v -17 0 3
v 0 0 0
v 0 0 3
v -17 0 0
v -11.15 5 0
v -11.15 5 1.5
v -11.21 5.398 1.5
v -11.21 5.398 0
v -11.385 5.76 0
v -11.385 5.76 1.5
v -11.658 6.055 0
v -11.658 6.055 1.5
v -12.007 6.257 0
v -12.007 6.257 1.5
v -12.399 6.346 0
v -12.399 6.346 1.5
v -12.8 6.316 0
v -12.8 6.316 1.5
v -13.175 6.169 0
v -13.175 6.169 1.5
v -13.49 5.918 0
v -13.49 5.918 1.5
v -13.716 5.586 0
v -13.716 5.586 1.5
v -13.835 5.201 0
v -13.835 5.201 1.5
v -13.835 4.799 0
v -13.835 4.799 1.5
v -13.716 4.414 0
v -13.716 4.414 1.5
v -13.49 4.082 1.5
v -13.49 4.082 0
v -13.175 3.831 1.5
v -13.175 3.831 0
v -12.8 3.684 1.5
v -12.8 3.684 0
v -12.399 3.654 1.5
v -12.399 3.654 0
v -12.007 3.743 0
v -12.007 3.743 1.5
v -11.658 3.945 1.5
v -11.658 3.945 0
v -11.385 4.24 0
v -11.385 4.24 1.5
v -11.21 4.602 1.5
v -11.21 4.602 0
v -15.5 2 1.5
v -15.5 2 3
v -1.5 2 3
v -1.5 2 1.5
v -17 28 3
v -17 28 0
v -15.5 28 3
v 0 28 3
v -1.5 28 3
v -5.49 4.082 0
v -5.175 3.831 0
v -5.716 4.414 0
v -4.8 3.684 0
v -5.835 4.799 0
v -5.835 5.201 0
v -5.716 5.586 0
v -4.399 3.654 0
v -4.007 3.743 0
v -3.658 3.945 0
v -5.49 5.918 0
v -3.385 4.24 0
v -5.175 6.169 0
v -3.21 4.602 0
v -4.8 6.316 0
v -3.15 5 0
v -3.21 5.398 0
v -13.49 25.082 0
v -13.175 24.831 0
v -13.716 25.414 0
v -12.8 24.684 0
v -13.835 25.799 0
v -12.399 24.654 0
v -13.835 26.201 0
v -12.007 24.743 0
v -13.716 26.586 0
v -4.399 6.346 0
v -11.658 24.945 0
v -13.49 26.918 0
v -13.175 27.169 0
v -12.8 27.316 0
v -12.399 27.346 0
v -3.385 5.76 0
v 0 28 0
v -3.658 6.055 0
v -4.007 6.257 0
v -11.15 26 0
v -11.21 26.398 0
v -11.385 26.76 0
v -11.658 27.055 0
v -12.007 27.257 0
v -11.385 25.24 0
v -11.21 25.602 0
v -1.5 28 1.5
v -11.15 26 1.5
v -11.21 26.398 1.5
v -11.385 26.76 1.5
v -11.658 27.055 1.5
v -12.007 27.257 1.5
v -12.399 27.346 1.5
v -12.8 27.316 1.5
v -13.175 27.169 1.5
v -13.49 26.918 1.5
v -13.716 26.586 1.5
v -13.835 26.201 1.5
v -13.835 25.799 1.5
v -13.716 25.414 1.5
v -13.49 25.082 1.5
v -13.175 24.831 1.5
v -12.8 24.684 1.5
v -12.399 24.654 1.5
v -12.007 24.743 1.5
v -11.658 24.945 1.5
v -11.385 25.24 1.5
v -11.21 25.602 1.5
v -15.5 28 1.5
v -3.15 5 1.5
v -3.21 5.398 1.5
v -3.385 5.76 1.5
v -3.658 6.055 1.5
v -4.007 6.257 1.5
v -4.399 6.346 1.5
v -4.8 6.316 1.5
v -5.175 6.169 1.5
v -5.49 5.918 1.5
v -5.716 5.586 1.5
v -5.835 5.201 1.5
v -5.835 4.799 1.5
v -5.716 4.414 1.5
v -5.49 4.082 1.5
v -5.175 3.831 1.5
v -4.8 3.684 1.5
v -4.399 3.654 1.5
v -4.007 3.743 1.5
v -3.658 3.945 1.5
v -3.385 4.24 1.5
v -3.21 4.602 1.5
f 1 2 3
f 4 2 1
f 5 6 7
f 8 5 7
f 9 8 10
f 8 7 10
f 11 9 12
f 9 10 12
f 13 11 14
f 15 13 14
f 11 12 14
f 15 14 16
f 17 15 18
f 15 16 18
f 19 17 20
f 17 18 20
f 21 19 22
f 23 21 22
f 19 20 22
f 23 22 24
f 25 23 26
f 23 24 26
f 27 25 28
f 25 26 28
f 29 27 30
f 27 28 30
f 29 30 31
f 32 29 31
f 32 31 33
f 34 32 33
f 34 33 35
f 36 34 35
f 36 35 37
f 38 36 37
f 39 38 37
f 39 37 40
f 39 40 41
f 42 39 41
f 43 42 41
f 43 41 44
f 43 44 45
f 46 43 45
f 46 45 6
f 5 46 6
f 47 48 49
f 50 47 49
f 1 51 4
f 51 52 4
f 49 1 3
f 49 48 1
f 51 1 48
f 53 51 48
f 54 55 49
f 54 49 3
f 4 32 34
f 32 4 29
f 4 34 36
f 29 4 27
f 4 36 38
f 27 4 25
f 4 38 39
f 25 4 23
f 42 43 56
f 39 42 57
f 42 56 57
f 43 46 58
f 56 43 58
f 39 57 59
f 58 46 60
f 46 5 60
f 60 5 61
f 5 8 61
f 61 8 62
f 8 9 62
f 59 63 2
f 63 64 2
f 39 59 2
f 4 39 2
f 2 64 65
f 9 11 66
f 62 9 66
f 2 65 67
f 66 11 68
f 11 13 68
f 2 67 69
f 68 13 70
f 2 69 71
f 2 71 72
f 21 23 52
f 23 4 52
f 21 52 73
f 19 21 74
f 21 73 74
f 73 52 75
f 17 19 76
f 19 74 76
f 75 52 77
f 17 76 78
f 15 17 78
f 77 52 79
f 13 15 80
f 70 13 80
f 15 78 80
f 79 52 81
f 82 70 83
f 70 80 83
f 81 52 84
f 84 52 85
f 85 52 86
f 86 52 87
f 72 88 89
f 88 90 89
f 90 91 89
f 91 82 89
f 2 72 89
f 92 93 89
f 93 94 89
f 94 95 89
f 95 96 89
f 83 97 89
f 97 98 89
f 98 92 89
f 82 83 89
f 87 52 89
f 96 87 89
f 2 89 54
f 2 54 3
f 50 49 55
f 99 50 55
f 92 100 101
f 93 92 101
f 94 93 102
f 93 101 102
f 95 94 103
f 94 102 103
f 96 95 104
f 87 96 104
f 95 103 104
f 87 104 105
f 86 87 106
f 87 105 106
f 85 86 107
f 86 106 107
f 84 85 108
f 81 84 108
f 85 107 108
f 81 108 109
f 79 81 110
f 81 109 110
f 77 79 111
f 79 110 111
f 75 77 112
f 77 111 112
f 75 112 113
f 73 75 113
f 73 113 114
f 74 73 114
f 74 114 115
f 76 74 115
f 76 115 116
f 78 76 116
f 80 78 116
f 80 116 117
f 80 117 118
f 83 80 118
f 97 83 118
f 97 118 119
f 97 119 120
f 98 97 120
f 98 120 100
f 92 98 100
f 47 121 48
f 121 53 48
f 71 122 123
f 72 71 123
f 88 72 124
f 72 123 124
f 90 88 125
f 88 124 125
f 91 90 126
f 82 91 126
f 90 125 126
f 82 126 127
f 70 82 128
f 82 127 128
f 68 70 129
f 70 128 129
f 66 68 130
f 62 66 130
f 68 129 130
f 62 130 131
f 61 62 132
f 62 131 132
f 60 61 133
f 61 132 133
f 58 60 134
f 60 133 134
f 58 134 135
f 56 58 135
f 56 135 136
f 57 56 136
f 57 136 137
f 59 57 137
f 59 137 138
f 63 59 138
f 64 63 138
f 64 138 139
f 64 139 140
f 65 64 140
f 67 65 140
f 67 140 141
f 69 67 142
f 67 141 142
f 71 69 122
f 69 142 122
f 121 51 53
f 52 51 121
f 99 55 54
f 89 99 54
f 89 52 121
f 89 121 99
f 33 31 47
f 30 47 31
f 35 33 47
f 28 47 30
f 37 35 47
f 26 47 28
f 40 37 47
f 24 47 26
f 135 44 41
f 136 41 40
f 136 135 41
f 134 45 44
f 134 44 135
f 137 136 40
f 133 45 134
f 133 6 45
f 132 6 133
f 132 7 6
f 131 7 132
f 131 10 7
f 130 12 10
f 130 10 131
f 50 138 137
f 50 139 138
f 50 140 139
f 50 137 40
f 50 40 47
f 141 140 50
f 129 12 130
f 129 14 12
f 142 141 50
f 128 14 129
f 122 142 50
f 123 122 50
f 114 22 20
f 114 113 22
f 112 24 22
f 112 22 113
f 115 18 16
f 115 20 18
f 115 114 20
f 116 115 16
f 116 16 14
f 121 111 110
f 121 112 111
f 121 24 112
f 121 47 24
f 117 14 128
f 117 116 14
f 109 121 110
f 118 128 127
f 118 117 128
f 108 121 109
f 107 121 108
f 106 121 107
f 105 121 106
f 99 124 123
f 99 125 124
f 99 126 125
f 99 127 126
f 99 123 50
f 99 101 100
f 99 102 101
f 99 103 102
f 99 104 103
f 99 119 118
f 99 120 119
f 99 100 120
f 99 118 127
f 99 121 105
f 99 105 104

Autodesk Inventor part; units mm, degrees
ref_plane "YZ Plane" through (0, 0, 0) normal (1, 0, 0) x (0, 1, 0)
ref_plane "XZ Plane" through (0, 0, 0) normal (0, 1, 0) x (-1, 0, 0)
ref_plane "XY Plane" through (0, 0, 0) normal (0, 0, 1) x (1, 0, 0)
sketch "Sketch1" plane through (0, 0, 0) normal (0, 0, 1) x (1, 0, 0)
  line L0 (-17, 28) -> (0, 28)
  line L1 (0, 7) -> (0, 0)
  line L2 (0, 0) -> (-17, 0)
  line L3 (-17, 0) -> (-17, 7)
  line L4 (-17, 28) -> (-17, 17)
  line L5 (0, 28) -> (0, 17)
  line L6 (-17, 17) -> (-17, 7)
  line L7 (0, 17) -> (0, 7)
  point P0 (0, 0)
  point P1 (4, 7)
  point P2 (4, 7)
  dimension "d0" = 17
  dimension "d2" = 28
extrude "Extrusion1" add sketch "Sketch1" along normal blind 3
sketch "Sketch2" plane through (0, 0, 3) normal (0, 0, 1) x (1, 0, 0)
  line L0 (-17, 28) -> (-17, 0) projected
  line L1 (-17, 0) -> (0, 0) projected
  line L2 (0, 0) -> (0, 28) projected
  line L3 (0, 28) -> (-17, 28) projected
  line L4 (-17, 0) -> (0, 0) projected
  line L5 (-15.5, 2) -> (-1.5, 2)
  line L6 (-1.5, 2) -> (-1.5, 28)
  line L7 (-1.5, 28) -> (-15.5, 28)
  line L8 (-15.5, 28) -> (-15.5, 2)
  line L9 (0, 28) -> (-17, 28) projected
  dimension "d7" = 14
  dimension "d19" = 26
extrude "Extrusion2" cut sketch "Sketch2" against normal blind 1.5 contours L3 L6 L5 L8
sketch "Sketch3" plane through (0, 0, 1.5) normal (0, 0, 1) x (1, 0, 0)
  line L0 (-1.5, 28) -> (-1.5, 2) projected
  line L1 (-15.5, 28) -> (-1.5, 28) projected
  line L2 (-15.5, 2) -> (-15.5, 28) projected
  circle A0 centre (-12.5, 26) radius 1.35
  circle A1 centre (-12.5, 5) radius 1.35
  circle A2 centre (-4.5, 5) radius 1.35
  line L3 (-1.5, 2) -> (-15.5, 2) projected
  point P0 (0, 0)
  dimension "d12" = 2.7
  dimension "d13" = 8
  dimension "d14" = 21
  dimension "d21" = 3
extrude "Extrusion3" cut sketch "Sketch3" against normal through all contours A0 | A1 | A2
properties part number "soporte"
